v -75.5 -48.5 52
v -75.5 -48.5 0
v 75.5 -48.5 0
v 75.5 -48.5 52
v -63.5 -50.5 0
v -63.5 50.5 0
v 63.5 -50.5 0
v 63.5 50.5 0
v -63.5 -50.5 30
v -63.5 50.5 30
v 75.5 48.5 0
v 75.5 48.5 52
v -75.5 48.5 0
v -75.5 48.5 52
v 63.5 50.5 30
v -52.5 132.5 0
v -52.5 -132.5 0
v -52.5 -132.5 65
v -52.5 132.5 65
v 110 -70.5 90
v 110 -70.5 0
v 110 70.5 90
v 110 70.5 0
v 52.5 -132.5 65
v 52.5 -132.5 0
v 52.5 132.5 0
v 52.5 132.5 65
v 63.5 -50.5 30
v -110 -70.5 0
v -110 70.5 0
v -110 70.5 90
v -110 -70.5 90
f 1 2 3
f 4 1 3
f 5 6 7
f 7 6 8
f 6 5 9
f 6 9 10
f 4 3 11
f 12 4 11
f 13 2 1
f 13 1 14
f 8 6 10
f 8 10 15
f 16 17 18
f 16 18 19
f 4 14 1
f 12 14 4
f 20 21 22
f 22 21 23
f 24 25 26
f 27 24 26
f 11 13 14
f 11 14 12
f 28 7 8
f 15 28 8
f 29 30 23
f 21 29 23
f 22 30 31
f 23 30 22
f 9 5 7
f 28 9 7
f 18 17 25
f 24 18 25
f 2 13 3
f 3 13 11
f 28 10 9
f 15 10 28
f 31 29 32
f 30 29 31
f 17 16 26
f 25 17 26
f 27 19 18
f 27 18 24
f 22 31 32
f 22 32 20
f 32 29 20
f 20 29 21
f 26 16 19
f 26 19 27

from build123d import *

# Parameters (mm, degrees)
F0_W     = 105
F0_H     = 265
F1_DEPTH = 65
F2_W     = 151
F2_H     = 97
F3_DEPTH = 52
F4_W     = 220
F4_H     = 141
F5_DEPTH = 90
F6_W     = 127
F6_H     = 101
F7_DEPTH = 30


with BuildPart() as f1:
    # F0 (on Top) → F1 (new body)
    with BuildSketch(Plane.XY):
        Rectangle(F0_W, F0_H)
    extrude(amount=F1_DEPTH)


with BuildPart() as f3:
    # F2 (on Top) → F3 (new body)
    with BuildSketch(Plane.XY):
        Rectangle(F2_W, F2_H)
    extrude(amount=F3_DEPTH)


with BuildPart() as f5:
    # F4 (on Top) → F5 (new body)
    with BuildSketch(Plane.XY):
        Rectangle(F4_W, F4_H)
    extrude(amount=F5_DEPTH)


with BuildPart() as f7:
    # F6 (on Top) → F7 (new body)
    with BuildSketch(Plane.XY):
        Rectangle(F6_W, F6_H)
    extrude(amount=F7_DEPTH)


solid = Compound([f1.part, f3.part, f5.part, f7.part])
